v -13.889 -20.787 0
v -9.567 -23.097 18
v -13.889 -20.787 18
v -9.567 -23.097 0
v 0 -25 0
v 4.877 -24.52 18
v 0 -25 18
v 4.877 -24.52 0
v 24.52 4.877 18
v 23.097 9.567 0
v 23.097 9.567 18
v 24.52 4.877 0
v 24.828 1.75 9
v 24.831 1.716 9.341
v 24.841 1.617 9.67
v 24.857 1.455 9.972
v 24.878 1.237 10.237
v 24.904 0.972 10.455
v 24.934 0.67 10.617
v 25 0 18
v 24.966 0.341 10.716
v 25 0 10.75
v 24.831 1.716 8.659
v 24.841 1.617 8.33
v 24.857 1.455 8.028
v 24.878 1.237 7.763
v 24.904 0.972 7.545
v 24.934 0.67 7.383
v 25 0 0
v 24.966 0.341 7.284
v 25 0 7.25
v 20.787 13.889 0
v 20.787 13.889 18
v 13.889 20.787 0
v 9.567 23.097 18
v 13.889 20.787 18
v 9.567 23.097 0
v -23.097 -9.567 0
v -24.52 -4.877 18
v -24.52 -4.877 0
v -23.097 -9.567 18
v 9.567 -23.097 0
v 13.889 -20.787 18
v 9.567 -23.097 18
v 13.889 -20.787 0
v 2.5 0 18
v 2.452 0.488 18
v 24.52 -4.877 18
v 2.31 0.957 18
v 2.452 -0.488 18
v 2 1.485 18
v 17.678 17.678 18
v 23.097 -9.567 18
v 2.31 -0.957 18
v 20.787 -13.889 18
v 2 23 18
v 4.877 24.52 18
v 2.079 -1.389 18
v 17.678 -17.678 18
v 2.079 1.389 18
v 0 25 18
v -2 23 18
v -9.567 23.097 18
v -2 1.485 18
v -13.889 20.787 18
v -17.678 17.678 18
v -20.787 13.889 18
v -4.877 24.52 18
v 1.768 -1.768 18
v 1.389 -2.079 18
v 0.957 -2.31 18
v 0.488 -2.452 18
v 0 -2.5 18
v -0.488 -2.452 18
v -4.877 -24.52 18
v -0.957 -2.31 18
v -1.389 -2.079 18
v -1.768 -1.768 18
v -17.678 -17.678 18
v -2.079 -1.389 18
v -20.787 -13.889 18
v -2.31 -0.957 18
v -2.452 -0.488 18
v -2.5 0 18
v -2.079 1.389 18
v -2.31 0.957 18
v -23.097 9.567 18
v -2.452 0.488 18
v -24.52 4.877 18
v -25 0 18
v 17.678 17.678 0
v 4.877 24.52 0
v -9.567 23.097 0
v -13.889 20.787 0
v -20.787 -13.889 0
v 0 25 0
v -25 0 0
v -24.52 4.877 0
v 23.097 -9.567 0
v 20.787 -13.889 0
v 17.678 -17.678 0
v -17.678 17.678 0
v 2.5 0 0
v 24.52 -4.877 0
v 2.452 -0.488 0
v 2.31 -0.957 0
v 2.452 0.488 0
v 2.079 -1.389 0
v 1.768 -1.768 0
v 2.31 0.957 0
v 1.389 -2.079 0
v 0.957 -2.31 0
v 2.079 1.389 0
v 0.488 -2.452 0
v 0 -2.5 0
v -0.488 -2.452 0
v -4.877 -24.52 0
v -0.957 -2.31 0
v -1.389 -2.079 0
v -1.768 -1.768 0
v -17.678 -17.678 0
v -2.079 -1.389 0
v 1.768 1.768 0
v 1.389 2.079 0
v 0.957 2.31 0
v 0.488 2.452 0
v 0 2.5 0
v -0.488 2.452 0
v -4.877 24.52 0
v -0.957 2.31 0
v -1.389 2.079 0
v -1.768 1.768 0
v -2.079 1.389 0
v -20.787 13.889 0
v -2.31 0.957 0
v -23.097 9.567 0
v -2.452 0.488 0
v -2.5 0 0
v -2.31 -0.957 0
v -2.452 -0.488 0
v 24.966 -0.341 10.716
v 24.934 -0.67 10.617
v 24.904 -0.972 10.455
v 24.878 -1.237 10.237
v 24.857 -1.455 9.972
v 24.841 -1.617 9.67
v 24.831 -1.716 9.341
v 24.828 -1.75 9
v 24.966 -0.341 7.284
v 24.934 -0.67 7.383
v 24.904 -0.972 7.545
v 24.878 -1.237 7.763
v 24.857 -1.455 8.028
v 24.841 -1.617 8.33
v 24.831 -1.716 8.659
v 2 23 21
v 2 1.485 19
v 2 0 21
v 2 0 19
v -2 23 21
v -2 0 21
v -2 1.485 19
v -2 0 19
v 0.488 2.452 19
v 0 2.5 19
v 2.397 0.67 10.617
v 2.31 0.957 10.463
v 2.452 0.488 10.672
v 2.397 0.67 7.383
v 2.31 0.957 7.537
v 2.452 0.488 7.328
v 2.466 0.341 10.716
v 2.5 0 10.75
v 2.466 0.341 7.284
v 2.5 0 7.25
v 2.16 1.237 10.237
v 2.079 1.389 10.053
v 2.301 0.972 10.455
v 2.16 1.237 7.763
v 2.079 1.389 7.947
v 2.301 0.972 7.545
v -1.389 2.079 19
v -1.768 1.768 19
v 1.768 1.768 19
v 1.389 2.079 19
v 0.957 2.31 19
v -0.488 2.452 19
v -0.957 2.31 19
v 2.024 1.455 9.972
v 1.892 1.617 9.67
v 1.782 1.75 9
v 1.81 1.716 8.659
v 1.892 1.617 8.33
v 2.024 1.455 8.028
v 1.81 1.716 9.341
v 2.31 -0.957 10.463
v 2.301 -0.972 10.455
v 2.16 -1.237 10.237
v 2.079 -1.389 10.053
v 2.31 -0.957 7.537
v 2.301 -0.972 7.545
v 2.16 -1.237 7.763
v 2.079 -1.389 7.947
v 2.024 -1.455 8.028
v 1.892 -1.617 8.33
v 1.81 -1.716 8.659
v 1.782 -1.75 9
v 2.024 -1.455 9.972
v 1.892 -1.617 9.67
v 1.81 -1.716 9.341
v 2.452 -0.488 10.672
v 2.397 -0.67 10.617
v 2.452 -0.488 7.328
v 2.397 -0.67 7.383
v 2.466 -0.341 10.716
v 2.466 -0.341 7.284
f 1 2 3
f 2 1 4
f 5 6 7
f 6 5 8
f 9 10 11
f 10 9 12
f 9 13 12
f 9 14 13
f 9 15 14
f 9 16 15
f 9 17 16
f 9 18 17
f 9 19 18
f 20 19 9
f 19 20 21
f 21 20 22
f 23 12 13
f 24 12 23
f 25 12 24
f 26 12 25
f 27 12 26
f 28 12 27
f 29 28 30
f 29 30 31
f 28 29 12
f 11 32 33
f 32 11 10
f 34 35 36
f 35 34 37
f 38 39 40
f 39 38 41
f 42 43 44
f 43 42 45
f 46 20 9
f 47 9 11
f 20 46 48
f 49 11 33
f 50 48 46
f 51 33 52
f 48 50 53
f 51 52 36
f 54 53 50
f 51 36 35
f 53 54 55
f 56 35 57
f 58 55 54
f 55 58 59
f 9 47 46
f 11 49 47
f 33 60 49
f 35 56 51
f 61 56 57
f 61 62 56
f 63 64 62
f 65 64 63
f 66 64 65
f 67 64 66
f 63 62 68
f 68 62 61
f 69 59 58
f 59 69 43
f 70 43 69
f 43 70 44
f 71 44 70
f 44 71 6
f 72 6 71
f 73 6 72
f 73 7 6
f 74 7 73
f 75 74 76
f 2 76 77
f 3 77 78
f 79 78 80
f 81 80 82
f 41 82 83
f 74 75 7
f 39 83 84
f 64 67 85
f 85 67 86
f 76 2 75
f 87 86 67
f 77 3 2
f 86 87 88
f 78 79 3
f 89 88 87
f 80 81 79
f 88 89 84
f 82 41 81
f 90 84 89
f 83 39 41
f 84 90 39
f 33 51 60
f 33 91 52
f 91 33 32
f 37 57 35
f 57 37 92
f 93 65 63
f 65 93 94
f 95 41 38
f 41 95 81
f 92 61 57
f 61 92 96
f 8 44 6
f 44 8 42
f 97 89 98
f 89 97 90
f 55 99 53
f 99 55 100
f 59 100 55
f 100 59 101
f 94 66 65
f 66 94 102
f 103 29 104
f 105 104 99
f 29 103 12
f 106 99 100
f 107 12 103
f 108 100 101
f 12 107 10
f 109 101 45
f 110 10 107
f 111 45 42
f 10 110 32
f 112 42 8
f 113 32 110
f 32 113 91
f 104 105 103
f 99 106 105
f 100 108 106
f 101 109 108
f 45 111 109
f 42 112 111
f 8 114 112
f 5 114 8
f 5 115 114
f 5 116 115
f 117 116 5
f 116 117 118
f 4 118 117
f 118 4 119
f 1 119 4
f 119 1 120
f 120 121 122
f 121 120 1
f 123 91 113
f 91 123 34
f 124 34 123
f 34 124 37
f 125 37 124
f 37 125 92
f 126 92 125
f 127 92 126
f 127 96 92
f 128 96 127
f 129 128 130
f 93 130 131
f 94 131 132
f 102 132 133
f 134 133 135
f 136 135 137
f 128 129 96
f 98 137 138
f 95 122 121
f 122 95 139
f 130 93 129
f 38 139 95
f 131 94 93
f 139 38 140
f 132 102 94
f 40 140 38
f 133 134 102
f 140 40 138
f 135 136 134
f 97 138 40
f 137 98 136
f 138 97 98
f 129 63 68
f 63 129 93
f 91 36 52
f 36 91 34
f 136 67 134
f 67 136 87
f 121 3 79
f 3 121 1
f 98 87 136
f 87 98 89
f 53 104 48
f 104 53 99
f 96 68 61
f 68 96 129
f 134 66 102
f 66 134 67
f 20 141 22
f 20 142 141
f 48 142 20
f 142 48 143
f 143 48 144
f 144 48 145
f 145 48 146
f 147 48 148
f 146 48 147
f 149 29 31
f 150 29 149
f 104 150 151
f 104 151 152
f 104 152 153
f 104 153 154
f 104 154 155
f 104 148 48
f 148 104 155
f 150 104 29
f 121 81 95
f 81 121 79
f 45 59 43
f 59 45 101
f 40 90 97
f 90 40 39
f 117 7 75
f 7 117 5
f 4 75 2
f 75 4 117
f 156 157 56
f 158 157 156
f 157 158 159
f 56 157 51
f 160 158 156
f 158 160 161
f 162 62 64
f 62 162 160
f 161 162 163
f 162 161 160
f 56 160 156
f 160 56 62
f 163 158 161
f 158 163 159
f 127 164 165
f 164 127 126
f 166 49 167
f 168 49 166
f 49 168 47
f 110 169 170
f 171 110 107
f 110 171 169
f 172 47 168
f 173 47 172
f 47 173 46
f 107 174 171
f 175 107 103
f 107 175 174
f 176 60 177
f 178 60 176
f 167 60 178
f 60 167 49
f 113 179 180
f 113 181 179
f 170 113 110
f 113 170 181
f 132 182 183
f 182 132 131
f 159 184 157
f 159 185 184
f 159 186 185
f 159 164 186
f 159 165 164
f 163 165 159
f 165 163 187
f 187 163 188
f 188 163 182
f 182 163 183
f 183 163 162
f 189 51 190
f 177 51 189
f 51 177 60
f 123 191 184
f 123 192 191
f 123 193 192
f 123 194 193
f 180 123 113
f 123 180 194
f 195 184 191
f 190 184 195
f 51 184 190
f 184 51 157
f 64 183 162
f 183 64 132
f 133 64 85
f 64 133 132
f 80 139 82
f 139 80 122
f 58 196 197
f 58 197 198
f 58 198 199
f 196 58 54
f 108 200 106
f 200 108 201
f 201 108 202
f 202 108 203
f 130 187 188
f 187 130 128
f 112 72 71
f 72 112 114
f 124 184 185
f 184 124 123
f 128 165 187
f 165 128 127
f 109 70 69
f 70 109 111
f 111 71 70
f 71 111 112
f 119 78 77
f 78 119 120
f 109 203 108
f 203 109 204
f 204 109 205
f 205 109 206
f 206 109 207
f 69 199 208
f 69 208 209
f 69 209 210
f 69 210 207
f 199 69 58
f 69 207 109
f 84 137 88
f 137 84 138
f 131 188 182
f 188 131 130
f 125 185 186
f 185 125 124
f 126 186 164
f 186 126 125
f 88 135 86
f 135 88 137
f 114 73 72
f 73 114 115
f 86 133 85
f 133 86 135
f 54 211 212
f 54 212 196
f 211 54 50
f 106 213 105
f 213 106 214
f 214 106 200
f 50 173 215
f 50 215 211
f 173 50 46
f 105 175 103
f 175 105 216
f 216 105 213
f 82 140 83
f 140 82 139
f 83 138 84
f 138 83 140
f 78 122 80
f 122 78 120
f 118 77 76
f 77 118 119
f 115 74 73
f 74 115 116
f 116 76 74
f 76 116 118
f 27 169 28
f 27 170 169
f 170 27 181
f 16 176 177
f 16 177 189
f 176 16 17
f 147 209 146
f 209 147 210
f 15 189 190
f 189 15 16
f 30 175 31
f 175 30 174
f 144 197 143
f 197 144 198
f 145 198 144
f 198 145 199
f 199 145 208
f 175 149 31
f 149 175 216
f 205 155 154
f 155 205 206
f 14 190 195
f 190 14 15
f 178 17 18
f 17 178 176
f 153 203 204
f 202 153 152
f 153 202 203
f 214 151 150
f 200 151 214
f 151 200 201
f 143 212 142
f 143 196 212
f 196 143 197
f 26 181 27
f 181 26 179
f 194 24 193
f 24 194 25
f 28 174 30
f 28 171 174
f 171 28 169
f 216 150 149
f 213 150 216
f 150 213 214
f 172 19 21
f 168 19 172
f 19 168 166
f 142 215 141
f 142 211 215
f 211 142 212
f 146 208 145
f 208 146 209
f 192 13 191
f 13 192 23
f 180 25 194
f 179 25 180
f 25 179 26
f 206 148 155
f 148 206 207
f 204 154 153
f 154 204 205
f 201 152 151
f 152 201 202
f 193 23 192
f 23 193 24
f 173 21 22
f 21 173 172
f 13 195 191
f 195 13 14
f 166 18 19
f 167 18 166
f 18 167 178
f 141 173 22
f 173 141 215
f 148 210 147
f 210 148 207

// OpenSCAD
$fn = 32;

// ----------------------------------------------------------------------
// Control knob: pointer knob
// ----------------------------------------------------------------------

// --- parameters (mm) ---
rib_w = 4;                // pointer rib width
rib_h = 4;                // pointer rib height
knob_d = 50;              // knob body diameter
knob_h = 18;              // knob body height
bore_d = 5;               // shaft bore diameter
set_d = 3.5;              // set screw bore diameter

rib_poke = rib_h - 1;  // rib height above the top
total_h = knob_h + rib_h - 1;  // overall height

difference() {
  union() {
    cylinder(h = knob_h, d = knob_d);
    translate([-rib_w / 2, 0, knob_h - 1])
      cube([rib_w, knob_d / 2 - 2, rib_h]);
  }
  translate([0, 0, -1]) cylinder(h = knob_h + 2, d = bore_d);
  translate([-1, 0, knob_h / 2]) rotate([0, 90, 0])
    cylinder(h = knob_d / 2 + bore_d / 2 + 2, d = set_d);}
